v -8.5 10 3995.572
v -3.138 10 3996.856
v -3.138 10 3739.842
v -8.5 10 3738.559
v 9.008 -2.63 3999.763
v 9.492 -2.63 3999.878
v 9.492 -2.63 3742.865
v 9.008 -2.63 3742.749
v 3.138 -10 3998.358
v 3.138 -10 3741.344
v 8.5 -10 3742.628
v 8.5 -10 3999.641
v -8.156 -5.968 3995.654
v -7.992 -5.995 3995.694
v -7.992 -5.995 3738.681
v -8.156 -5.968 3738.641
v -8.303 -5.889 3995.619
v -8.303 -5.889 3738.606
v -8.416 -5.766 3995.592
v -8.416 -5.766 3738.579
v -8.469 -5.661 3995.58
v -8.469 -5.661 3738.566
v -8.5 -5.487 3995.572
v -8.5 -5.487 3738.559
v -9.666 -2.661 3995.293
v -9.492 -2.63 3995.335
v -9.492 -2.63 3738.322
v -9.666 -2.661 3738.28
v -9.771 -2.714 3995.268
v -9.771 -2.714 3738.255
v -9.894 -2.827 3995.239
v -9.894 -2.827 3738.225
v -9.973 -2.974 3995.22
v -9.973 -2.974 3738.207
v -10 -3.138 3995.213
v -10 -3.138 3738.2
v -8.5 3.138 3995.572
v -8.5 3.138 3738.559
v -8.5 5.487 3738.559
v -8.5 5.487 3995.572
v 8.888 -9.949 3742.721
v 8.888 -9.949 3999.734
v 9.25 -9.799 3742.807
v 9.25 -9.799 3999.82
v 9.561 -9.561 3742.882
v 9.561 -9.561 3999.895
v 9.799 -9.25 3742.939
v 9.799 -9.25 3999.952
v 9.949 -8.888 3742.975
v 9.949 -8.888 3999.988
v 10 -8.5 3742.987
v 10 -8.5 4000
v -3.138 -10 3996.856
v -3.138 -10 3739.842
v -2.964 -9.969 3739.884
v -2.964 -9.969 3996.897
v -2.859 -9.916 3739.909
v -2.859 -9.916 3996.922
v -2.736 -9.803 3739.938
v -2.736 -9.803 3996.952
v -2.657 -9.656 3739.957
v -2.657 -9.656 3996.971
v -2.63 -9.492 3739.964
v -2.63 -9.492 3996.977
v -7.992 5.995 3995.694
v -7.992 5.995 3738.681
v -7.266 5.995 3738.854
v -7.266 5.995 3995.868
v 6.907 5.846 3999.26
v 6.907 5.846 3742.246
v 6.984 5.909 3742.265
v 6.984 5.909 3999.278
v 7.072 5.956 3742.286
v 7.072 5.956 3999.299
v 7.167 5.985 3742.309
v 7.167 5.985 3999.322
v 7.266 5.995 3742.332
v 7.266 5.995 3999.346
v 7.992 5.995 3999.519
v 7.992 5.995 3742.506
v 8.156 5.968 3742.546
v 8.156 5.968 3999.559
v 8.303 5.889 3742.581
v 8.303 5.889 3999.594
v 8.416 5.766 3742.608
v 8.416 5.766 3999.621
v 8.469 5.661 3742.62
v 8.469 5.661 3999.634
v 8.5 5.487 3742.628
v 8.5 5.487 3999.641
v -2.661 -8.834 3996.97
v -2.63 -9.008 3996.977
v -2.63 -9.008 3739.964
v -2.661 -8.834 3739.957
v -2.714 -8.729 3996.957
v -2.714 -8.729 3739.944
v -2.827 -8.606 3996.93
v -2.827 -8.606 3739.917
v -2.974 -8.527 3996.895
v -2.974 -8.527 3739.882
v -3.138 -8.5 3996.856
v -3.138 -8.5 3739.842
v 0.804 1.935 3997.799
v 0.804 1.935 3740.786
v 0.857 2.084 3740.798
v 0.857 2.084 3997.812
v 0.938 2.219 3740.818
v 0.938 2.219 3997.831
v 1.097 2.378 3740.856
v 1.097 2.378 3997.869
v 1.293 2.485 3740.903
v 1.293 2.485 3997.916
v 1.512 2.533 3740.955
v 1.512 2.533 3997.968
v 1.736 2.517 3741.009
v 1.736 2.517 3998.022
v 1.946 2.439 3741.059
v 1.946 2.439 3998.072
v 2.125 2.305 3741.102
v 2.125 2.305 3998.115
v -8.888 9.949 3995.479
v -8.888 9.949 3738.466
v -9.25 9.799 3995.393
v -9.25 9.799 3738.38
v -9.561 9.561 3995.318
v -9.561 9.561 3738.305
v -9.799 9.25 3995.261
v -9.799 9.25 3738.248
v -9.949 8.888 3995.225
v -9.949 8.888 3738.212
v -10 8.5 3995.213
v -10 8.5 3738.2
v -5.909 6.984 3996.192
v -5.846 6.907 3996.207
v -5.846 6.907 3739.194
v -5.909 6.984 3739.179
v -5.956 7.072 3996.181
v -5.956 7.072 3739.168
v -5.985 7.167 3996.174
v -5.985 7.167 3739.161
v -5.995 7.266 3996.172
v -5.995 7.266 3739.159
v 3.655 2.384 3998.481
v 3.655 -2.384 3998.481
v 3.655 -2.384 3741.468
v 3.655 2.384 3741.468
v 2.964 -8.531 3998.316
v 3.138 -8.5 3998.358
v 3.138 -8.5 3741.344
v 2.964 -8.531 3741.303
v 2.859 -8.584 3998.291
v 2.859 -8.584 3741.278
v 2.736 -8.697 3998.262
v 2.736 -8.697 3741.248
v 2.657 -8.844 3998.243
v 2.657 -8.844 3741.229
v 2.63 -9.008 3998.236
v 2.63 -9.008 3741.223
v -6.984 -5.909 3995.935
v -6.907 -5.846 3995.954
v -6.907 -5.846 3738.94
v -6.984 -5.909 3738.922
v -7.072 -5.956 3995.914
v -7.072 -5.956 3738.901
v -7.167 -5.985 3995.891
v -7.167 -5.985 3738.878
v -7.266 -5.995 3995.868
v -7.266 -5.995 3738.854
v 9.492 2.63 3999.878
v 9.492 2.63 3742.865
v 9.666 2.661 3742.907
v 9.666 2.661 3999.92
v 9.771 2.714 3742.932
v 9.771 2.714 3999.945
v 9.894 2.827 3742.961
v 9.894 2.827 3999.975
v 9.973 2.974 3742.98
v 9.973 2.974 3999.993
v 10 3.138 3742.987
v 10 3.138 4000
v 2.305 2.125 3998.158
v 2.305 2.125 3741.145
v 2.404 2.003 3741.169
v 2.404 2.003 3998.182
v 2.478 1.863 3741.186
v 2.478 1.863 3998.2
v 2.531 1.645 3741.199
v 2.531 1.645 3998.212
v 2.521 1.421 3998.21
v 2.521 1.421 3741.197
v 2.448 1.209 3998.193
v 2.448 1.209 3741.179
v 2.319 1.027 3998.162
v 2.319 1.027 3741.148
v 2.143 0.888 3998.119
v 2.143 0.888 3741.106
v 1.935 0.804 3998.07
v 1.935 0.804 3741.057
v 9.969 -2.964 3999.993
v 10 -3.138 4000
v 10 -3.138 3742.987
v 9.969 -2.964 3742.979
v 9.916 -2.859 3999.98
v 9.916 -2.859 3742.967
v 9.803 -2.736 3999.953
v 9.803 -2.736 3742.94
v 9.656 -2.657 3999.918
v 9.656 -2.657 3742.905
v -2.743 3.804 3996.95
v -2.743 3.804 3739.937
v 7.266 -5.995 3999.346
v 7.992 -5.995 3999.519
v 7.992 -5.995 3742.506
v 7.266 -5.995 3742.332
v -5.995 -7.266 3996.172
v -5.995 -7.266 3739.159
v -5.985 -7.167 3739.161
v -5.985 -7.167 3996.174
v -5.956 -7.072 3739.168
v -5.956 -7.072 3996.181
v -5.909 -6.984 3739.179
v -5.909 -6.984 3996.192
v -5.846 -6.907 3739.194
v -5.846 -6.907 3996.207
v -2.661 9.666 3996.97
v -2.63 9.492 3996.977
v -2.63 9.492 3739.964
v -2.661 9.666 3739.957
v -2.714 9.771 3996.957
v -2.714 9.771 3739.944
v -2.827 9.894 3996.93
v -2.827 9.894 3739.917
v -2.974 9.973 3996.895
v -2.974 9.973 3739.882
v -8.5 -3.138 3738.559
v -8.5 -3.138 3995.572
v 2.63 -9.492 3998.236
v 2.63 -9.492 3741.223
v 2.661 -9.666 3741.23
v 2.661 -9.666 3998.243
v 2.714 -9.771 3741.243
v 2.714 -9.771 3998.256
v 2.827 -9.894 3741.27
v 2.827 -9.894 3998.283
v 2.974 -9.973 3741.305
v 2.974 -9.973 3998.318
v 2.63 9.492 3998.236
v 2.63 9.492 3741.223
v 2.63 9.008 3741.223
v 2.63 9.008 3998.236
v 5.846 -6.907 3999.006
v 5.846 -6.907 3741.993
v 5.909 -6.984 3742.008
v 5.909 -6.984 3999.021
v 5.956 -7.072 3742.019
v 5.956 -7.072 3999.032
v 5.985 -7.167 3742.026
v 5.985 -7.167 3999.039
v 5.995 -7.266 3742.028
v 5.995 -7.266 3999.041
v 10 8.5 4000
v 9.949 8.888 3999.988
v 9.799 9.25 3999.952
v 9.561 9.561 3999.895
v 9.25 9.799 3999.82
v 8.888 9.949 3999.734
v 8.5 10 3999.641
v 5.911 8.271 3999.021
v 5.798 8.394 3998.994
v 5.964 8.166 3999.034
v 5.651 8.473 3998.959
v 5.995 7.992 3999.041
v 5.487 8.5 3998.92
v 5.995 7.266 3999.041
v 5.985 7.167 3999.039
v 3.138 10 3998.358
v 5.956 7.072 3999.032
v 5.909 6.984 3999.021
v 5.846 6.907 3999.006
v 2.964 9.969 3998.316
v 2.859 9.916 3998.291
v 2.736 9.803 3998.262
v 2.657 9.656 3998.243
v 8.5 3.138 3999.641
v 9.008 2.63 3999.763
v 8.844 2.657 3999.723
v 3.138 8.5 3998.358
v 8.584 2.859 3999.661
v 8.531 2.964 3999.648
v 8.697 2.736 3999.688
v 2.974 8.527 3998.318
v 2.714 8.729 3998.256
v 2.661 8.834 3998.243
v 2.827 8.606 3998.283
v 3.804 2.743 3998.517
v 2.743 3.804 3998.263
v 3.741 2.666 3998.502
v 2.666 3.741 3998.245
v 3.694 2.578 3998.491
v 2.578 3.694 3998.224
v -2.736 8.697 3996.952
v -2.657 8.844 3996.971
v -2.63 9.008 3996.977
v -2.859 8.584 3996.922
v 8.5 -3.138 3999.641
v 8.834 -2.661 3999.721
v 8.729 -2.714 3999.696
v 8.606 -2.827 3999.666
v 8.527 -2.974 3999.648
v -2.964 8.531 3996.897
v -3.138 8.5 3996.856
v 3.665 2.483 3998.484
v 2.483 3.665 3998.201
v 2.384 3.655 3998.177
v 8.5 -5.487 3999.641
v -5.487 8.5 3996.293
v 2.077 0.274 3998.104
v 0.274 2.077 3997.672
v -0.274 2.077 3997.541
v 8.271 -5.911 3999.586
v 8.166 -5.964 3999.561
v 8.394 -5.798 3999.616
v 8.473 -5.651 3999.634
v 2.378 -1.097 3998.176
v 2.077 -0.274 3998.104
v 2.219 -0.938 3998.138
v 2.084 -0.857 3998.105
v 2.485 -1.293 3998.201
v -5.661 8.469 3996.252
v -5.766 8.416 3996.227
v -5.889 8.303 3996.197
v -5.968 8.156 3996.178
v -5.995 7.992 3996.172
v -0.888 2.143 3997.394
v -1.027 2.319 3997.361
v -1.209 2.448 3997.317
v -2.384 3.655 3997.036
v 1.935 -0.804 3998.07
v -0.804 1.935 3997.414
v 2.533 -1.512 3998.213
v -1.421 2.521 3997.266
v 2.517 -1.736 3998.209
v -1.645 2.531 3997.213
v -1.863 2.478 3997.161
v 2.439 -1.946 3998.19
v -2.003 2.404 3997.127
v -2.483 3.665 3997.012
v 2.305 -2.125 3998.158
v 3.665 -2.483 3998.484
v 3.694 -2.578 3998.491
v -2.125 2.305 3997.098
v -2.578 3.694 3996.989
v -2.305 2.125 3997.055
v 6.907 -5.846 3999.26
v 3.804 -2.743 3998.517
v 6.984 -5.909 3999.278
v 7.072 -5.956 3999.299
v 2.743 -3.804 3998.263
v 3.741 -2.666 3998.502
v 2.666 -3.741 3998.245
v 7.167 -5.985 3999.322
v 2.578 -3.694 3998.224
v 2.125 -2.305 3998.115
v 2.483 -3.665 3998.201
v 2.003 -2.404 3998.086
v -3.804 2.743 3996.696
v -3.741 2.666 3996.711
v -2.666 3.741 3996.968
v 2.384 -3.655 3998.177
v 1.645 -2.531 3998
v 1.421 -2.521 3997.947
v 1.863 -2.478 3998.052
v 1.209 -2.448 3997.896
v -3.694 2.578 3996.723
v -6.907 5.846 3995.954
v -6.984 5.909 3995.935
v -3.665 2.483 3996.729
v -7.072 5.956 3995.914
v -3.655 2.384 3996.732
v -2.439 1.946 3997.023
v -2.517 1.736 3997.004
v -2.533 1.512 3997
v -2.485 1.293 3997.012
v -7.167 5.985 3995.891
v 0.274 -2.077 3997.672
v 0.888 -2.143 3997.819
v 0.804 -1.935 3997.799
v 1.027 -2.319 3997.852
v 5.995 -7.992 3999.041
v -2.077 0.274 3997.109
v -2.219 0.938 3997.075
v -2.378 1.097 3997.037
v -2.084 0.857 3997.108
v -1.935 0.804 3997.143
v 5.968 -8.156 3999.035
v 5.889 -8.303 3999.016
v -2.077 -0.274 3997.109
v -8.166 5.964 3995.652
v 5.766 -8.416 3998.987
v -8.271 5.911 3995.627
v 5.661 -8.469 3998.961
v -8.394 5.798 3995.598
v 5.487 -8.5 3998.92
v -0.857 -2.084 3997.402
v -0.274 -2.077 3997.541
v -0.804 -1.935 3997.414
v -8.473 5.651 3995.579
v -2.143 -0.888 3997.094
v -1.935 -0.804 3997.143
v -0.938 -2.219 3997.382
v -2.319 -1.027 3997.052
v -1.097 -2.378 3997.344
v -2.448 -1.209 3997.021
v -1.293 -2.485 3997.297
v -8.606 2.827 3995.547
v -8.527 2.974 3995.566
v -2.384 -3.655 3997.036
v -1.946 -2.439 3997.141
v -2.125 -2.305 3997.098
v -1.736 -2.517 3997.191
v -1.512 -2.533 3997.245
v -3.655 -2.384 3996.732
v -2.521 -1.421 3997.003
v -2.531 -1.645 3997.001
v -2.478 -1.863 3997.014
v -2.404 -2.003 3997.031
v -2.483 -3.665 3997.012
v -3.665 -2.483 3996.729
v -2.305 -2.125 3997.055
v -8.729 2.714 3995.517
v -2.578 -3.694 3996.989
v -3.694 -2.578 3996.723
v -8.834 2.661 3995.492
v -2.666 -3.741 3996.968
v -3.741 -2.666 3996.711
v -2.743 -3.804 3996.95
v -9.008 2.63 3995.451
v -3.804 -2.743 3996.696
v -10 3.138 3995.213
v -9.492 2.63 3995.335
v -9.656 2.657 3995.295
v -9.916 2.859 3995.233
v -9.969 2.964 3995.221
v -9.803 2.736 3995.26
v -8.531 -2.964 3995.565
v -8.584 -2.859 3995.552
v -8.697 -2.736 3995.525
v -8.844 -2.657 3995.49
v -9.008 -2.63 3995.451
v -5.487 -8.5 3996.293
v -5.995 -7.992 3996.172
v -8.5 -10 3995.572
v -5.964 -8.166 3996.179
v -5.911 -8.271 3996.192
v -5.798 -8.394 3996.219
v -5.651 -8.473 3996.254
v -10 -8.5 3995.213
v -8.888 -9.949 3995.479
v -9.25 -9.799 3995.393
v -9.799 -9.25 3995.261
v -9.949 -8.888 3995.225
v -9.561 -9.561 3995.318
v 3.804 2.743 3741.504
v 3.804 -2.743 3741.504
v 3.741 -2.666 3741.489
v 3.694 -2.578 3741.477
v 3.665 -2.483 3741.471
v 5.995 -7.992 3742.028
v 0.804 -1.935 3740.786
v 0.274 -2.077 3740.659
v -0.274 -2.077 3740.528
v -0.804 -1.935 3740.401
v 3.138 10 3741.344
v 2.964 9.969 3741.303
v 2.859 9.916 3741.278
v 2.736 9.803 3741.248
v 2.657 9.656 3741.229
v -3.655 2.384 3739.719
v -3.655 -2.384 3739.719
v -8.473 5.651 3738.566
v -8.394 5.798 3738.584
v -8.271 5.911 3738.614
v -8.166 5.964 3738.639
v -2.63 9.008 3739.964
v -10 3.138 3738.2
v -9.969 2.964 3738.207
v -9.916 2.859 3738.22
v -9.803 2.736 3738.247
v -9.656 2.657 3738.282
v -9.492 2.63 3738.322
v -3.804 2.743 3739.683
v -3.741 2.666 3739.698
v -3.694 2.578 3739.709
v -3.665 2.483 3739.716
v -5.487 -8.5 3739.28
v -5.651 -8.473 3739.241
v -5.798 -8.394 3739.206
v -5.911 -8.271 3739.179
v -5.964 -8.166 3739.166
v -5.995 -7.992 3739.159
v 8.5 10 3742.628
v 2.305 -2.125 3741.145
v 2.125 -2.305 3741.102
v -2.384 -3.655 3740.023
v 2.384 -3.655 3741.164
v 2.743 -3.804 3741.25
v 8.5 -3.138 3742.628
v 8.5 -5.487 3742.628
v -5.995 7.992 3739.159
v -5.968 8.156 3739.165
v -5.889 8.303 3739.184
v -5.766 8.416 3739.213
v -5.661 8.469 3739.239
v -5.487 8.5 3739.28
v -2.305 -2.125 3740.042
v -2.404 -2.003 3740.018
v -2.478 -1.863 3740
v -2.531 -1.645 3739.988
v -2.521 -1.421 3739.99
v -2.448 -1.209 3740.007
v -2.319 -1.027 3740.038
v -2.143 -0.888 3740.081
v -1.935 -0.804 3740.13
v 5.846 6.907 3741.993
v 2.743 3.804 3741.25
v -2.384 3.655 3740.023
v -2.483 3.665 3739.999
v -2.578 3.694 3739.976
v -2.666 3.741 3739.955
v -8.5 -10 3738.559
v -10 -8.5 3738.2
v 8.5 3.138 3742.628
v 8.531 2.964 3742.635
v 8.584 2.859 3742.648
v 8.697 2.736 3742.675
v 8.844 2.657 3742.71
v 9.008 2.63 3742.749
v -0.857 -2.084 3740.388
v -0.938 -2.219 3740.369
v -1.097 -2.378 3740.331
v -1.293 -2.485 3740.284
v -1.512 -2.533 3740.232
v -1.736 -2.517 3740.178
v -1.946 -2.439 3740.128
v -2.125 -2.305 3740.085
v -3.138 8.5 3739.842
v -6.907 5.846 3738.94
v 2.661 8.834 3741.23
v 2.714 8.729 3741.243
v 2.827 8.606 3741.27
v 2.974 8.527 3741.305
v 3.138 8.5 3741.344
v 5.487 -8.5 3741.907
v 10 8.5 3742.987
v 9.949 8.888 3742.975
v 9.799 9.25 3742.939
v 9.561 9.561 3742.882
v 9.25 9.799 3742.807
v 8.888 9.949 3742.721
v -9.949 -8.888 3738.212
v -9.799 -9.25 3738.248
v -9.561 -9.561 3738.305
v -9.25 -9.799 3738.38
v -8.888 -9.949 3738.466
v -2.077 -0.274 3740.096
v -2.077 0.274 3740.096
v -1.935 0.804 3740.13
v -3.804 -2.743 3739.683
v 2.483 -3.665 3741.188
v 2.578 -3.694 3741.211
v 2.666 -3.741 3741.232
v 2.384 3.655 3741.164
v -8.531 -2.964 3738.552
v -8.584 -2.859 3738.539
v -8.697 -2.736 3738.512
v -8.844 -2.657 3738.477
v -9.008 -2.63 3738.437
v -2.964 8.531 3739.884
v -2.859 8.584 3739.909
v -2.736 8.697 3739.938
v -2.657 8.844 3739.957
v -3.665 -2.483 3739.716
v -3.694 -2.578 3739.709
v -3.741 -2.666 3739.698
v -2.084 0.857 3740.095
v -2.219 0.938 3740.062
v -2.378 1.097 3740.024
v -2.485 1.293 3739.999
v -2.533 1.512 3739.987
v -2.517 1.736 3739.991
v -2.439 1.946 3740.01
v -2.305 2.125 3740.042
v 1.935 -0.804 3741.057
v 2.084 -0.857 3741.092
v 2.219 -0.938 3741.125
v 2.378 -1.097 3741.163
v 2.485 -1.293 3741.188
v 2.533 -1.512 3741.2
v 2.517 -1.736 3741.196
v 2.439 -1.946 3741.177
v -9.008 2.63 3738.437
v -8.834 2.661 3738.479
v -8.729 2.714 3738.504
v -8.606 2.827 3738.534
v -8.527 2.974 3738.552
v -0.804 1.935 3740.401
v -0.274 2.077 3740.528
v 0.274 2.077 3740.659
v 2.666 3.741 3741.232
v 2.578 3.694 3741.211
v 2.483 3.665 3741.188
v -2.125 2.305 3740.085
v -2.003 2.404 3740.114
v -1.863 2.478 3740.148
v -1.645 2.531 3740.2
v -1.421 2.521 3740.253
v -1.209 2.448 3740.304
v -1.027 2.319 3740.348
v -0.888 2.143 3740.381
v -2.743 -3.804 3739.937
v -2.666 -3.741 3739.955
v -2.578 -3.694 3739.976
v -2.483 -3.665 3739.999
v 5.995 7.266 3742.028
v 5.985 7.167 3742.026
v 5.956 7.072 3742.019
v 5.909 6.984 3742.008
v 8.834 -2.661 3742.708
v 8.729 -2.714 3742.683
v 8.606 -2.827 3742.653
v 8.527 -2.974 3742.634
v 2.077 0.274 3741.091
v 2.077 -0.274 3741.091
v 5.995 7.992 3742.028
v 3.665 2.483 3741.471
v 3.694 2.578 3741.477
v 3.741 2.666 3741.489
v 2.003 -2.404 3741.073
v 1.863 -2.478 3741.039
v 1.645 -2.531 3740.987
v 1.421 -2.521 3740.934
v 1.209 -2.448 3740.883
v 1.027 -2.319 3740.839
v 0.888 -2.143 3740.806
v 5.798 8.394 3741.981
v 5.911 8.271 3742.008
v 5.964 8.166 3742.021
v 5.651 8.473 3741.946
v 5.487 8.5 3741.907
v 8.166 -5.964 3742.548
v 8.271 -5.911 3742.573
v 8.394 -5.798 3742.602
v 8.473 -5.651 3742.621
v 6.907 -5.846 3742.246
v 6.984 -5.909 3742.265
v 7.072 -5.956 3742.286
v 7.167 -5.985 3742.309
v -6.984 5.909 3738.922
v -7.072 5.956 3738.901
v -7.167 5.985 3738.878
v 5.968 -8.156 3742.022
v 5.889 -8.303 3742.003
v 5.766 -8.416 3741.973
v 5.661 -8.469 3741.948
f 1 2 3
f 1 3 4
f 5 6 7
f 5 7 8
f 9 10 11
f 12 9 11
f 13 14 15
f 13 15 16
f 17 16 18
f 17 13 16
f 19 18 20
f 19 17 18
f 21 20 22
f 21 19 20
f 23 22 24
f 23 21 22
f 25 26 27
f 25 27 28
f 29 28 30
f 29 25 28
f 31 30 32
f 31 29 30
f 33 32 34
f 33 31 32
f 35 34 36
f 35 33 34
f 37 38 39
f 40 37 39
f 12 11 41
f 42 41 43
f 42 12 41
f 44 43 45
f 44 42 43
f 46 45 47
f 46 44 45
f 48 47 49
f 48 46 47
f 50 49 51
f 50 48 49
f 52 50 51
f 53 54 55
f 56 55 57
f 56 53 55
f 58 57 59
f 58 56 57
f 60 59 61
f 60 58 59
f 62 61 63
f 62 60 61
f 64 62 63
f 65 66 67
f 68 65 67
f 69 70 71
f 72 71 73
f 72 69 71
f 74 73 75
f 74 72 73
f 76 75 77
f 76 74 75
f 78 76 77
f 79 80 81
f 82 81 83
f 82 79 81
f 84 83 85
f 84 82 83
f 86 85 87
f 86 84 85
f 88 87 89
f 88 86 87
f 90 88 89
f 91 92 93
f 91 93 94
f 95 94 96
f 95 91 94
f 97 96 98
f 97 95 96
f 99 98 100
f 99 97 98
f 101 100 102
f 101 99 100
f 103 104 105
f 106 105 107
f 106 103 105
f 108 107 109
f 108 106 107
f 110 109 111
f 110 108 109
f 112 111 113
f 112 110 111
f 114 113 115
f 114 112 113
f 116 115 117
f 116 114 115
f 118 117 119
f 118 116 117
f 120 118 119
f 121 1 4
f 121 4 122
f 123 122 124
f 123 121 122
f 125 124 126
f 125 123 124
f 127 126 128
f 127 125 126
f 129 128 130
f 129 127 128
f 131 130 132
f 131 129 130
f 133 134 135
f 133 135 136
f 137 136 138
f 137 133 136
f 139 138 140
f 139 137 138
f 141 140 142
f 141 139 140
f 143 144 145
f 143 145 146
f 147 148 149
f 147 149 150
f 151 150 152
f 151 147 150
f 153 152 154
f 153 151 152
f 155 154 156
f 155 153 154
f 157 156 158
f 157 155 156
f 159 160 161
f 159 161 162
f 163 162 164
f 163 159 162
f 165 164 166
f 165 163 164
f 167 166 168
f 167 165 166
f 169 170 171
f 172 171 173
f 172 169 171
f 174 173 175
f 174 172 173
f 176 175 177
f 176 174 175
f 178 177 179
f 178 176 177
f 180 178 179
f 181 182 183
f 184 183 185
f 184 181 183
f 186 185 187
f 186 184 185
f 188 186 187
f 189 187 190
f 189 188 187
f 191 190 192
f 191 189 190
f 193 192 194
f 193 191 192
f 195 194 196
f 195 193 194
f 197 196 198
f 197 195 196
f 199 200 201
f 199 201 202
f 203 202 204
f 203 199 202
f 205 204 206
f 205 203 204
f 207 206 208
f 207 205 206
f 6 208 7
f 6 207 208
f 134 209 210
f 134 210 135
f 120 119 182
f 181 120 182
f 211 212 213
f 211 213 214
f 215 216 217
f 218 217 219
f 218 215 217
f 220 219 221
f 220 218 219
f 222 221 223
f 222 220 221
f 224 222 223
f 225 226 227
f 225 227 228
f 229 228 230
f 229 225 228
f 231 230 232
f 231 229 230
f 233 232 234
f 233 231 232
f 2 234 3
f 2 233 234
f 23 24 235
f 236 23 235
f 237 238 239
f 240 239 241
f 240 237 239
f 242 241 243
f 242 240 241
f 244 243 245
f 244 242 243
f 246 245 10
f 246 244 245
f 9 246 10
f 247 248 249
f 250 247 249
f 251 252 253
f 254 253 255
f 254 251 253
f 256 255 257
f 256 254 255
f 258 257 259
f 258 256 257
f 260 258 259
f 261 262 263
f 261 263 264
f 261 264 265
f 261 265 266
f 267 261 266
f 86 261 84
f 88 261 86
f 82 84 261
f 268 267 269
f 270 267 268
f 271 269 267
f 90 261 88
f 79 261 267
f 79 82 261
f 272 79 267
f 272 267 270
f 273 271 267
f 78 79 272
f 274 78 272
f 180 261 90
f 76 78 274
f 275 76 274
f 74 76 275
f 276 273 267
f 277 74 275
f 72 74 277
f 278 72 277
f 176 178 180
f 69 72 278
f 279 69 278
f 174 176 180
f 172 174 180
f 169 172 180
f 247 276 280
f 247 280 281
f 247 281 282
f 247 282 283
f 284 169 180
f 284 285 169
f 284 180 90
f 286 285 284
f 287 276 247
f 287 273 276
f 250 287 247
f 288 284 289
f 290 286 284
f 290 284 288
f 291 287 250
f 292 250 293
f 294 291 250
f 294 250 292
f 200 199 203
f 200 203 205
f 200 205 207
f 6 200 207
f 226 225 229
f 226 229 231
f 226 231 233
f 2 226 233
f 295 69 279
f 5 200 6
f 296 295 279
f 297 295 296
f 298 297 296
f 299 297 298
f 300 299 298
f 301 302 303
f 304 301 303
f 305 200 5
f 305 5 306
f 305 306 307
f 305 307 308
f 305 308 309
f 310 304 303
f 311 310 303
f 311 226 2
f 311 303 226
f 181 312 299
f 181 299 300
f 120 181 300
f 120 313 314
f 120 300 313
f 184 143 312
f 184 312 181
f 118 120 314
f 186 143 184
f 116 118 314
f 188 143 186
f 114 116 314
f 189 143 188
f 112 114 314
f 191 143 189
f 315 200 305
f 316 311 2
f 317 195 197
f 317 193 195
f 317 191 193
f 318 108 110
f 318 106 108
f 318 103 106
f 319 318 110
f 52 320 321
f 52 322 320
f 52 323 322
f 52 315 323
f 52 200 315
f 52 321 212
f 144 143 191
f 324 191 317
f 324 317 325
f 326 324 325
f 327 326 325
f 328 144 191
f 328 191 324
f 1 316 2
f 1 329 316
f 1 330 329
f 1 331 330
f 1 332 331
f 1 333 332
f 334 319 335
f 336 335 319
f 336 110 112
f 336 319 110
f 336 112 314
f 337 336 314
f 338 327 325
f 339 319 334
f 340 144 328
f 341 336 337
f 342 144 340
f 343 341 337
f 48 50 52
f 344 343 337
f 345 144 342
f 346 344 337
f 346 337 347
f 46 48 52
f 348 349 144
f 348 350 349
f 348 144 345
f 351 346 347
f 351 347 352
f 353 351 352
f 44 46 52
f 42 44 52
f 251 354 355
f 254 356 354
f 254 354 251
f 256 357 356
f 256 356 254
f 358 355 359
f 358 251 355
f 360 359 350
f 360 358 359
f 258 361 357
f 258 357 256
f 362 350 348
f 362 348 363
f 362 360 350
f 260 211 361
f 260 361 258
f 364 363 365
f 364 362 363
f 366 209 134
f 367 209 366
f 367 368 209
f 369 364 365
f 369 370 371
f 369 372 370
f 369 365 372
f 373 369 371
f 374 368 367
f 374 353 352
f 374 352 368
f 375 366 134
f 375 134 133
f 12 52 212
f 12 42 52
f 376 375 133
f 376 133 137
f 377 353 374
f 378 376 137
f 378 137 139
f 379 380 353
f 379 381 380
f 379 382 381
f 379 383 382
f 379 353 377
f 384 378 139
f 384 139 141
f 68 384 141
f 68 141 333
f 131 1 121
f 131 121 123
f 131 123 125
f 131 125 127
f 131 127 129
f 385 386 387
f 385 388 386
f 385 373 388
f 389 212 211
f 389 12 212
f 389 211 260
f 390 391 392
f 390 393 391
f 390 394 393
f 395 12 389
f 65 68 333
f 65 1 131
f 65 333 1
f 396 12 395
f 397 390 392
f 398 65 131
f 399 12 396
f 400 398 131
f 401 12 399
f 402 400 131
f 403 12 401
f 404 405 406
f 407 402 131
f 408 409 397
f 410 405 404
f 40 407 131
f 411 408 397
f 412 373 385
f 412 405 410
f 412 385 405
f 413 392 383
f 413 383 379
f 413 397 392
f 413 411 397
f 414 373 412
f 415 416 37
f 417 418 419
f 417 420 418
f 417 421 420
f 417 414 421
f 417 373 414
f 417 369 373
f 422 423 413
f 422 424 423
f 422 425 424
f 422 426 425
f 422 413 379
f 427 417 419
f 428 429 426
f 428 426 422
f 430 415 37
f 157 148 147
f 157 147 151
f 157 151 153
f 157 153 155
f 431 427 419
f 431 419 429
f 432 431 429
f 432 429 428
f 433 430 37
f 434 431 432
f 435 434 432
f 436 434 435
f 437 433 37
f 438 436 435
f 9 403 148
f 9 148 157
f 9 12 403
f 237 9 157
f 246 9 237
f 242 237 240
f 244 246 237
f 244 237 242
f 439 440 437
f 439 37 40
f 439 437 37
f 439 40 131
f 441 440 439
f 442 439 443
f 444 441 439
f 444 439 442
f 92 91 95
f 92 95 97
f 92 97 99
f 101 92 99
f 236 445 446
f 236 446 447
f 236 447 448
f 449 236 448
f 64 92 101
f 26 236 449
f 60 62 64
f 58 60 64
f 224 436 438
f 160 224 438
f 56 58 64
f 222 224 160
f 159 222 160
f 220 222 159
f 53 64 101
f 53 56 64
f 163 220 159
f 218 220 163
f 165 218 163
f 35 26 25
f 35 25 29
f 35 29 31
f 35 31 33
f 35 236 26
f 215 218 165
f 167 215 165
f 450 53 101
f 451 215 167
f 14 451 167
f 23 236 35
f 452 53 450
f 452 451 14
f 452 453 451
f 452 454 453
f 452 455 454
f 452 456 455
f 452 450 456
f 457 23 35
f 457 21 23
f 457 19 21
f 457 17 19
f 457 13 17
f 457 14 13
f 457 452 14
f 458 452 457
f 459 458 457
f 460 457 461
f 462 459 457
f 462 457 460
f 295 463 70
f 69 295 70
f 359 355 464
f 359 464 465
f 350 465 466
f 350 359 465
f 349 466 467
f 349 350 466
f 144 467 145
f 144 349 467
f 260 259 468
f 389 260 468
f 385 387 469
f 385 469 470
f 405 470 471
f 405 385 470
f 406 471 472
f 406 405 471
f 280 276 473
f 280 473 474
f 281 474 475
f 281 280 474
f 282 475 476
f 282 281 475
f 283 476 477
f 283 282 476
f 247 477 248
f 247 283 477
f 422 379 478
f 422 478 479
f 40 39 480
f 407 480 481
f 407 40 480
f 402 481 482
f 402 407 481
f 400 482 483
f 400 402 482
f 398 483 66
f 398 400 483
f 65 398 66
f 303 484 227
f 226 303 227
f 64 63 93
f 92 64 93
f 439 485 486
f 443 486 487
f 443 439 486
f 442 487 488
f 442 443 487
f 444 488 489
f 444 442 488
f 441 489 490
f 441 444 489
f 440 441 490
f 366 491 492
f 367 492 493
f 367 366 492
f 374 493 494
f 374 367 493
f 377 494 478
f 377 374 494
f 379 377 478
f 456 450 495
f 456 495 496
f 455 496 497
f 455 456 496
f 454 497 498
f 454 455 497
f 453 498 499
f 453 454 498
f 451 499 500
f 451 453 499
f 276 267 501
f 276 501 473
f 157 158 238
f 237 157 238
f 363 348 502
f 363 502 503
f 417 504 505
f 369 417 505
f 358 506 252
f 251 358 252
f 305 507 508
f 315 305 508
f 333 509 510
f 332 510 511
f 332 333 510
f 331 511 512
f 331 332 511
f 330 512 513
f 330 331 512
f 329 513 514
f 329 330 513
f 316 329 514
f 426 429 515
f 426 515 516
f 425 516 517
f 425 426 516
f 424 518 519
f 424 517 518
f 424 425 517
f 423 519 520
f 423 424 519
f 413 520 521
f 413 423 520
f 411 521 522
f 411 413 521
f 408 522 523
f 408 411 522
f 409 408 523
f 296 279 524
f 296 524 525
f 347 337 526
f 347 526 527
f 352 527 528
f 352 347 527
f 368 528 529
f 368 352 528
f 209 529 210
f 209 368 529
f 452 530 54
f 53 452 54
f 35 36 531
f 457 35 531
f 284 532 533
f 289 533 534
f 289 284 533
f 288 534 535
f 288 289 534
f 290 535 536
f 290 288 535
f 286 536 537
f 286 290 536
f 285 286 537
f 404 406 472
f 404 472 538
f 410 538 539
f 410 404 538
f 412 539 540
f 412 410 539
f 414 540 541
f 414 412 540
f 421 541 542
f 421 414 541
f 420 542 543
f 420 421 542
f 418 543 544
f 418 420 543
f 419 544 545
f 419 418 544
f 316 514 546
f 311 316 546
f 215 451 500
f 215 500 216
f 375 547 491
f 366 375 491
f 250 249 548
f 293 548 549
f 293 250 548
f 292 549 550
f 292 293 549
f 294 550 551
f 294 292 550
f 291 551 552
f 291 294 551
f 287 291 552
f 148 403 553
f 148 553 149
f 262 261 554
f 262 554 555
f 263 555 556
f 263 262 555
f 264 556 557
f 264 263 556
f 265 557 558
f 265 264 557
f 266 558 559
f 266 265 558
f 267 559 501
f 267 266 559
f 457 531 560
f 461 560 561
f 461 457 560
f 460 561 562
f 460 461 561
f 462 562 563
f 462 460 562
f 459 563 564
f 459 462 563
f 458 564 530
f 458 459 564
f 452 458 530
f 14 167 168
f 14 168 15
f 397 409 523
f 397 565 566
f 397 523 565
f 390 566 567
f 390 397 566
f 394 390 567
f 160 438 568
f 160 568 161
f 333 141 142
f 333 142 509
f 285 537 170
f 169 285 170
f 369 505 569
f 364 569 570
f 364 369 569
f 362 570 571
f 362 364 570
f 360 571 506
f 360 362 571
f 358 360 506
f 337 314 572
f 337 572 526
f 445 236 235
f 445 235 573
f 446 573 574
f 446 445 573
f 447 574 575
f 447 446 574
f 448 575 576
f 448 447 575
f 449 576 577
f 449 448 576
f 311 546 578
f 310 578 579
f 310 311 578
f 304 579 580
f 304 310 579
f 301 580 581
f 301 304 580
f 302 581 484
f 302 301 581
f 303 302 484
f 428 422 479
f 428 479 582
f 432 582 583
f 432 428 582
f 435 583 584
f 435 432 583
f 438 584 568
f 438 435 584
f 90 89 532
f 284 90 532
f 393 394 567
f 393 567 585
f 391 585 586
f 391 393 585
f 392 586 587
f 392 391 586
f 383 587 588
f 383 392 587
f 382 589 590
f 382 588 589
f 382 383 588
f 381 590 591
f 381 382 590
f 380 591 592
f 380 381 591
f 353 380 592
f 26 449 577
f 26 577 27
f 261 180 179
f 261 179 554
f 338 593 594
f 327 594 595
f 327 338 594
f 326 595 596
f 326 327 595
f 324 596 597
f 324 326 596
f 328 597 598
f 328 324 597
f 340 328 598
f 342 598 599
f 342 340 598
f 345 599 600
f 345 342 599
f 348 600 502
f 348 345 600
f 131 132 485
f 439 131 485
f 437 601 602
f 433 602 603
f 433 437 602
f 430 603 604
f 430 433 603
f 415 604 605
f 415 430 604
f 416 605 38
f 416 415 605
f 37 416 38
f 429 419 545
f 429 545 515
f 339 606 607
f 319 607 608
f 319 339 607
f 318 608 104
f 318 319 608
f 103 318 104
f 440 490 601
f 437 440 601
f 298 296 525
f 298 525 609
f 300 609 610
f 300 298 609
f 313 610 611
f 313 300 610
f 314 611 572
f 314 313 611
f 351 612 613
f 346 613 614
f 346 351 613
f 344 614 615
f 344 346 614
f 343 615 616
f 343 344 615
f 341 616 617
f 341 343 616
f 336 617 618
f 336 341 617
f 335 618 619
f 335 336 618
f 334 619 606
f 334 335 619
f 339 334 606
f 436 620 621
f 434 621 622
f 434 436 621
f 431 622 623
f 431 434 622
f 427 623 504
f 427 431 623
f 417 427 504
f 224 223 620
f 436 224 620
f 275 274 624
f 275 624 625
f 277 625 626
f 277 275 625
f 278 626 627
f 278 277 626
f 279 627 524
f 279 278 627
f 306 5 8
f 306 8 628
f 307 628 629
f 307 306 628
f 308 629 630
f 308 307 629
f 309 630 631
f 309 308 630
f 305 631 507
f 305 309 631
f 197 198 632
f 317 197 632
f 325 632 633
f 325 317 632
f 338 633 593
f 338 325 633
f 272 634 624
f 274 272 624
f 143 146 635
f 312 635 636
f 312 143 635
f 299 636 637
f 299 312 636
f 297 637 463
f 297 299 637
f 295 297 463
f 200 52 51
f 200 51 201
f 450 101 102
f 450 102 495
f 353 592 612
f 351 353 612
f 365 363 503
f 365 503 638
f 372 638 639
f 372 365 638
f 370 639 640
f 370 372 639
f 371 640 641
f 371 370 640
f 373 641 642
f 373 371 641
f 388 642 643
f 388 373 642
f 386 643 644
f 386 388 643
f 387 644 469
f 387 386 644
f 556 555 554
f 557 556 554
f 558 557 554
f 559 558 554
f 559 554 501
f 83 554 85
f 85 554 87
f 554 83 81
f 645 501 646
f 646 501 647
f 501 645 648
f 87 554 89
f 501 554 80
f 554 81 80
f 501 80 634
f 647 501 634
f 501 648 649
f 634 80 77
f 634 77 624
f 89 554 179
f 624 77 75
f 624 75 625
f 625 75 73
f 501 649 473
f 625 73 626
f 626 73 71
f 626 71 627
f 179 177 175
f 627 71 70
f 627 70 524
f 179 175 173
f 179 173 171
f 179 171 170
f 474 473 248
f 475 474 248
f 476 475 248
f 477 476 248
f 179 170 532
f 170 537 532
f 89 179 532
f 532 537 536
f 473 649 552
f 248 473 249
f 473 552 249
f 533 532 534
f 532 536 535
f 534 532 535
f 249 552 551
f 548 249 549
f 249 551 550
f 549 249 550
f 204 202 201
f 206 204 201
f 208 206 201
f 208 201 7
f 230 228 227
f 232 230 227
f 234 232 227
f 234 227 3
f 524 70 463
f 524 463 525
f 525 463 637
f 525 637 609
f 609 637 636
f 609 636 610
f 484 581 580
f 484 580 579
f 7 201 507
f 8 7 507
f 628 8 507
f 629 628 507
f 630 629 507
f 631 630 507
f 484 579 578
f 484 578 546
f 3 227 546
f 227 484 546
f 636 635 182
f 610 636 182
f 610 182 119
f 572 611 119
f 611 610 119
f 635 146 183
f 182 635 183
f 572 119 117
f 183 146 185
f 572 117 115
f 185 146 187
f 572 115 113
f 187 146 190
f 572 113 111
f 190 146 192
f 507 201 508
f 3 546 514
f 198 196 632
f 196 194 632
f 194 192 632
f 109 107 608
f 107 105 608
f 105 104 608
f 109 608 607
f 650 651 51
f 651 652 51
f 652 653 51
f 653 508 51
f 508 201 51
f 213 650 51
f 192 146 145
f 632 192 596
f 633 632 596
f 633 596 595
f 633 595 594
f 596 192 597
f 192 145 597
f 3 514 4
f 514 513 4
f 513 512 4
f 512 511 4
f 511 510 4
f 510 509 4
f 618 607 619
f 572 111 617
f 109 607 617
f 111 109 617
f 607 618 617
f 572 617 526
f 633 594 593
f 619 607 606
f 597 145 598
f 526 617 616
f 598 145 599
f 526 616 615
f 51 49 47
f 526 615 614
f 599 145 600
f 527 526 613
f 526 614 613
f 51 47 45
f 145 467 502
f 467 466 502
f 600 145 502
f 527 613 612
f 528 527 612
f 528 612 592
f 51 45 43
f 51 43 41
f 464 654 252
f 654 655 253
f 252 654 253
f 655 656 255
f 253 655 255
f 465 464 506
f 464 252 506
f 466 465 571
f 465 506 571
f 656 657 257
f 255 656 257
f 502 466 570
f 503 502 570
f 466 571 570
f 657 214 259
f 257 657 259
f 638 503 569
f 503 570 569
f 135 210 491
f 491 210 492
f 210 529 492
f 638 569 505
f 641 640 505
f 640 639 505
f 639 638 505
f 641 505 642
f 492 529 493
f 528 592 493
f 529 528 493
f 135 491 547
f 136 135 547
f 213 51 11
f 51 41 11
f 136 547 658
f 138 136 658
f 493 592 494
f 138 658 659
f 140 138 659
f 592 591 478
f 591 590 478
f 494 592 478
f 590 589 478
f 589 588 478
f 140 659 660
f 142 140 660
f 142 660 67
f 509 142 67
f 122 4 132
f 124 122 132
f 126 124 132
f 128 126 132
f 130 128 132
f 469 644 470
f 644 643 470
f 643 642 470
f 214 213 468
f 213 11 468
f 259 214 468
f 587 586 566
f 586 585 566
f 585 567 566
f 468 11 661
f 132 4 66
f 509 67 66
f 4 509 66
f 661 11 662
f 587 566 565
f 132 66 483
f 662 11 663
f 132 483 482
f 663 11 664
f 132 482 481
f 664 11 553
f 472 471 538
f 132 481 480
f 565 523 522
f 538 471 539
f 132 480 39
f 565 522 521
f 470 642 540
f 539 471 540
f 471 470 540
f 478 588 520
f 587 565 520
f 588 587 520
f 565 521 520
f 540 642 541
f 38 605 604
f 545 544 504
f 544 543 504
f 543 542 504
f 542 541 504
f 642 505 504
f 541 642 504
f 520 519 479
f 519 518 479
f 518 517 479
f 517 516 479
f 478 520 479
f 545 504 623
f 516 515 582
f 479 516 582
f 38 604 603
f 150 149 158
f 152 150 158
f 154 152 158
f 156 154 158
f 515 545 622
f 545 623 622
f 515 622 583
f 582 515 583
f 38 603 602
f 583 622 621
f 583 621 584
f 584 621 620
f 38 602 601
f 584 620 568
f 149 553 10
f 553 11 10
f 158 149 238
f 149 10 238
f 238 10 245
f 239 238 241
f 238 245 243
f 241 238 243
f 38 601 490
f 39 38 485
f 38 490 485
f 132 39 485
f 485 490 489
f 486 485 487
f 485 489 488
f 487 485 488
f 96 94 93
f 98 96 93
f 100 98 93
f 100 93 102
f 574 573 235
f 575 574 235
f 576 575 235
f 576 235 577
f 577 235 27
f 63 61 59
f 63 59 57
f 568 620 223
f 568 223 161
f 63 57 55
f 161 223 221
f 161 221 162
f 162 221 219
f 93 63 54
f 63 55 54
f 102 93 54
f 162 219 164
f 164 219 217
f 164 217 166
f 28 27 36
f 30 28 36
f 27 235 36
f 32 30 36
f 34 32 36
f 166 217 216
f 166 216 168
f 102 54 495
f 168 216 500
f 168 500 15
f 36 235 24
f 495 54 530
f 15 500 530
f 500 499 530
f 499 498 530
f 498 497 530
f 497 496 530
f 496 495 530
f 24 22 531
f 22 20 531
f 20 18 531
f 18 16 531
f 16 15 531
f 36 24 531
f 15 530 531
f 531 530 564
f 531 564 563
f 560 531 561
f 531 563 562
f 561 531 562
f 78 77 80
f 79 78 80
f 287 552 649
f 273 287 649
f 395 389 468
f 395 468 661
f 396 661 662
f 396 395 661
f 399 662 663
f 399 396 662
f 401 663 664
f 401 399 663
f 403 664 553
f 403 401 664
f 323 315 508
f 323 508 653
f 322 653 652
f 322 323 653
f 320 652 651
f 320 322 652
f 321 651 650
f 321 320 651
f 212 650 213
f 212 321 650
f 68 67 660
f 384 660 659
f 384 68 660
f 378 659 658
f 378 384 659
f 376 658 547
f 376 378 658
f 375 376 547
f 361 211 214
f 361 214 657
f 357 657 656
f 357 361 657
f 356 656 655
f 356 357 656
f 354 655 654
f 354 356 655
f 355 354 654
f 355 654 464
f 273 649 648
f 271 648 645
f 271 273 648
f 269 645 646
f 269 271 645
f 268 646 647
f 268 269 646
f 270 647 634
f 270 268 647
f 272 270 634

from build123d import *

# Parameters (mm, degrees)
BOSS_EXTRUDE1_DEPTH = 261.8
CUT_EXTRUDE1_DEPTH  = 4001.062499512


with BuildPart() as part:
    # Sketch1 → Boss-Extrude1 (new body)
    with BuildSketch(Plane.XY.offset(4000)):
        with BuildLine():
            Line((10, 3.138), (10, 8.5))
            ThreePointArc((10, 8.5), (9.560660172, 9.560660172), (8.5, 10))
            Line((8.5, 10), (3.138, 10))
            ThreePointArc((3.138, 10), (2.778789755, 9.851210245), (2.63, 9.492))
            Line((2.63, 9.492), (2.63, 9.008))
            ThreePointArc((2.63, 9.008), (2.778789755, 8.648789755), (3.138, 8.5))
            Line((3.138, 8.5), (5.487, 8.5))
            ThreePointArc((5.487, 8.5), (5.846210245, 8.351210245), (5.995, 7.992))
            Line((5.995, 7.992), (5.995, 7.266080661))
            ThreePointArc((5.995, 7.266080661), (5.956330803, 7.071677478), (5.846210245, 6.906870417))
            Line((5.846210245, 6.906870417), (2.743129583, 3.803789755))
            ThreePointArc((2.743129583, 3.803789755), (2.578322522, 3.693669197), (2.383919339, 3.655))
            Line((2.383919339, 3.655), (-2.383919339, 3.655))
            ThreePointArc((-2.383919339, 3.655), (-2.578322522, 3.693669197), (-2.743129583, 3.803789755))
            Line((-2.743129583, 3.803789755), (-5.846210245, 6.906870417))
            ThreePointArc((-5.846210245, 6.906870417), (-5.956330803, 7.071677478), (-5.995, 7.266080661))
            Line((-5.995, 7.266080661), (-5.995, 7.992))
            ThreePointArc((-5.995, 7.992), (-5.846210245, 8.351210245), (-5.487, 8.5))
            Line((-5.487, 8.5), (-3.138, 8.5))
            ThreePointArc((-3.138, 8.5), (-2.778789755, 8.648789755), (-2.63, 9.008))
            Line((-2.63, 9.008), (-2.63, 9.492))
            ThreePointArc((-2.63, 9.492), (-2.778789755, 9.851210245), (-3.138, 10))
            Line((-3.138, 10), (-8.5, 10))
            ThreePointArc((-8.5, 10), (-9.560660172, 9.560660172), (-10, 8.5))
            Line((-10, 8.5), (-10, 3.138))
            ThreePointArc((-10, 3.138), (-9.851210245, 2.778789755), (-9.492, 2.63))
            Line((-9.492, 2.63), (-9.008, 2.63))
            ThreePointArc((-9.008, 2.63), (-8.648789755, 2.778789755), (-8.5, 3.138))
            Line((-8.5, 3.138), (-8.5, 5.487))
            ThreePointArc((-8.5, 5.487), (-8.351210245, 5.846210245), (-7.992, 5.995))
            Line((-7.992, 5.995), (-7.266080661, 5.995))
            ThreePointArc((-7.266080661, 5.995), (-7.071677478, 5.956330803), (-6.906870417, 5.846210245))
            Line((-6.906870417, 5.846210245), (-3.803789755, 2.743129583))
            ThreePointArc((-3.803789755, 2.743129583), (-3.693669197, 2.578322522), (-3.655, 2.383919339))
            Line((-3.655, 2.383919339), (-3.655, -2.383919339))
            ThreePointArc((-3.655, -2.383919339), (-3.693669197, -2.578322522), (-3.803789755, -2.743129583))
            Line((-3.803789755, -2.743129583), (-6.906870417, -5.846210245))
            ThreePointArc((-6.906870417, -5.846210245), (-7.071677478, -5.956330803), (-7.266080661, -5.995))
            Line((-7.266080661, -5.995), (-7.992, -5.995))
            ThreePointArc((-7.992, -5.995), (-8.351210245, -5.846210245), (-8.5, -5.487))
            Line((-8.5, -5.487), (-8.5, -3.138))
            ThreePointArc((-8.5, -3.138), (-8.648789755, -2.778789755), (-9.008, -2.63))
            Line((-9.008, -2.63), (-9.492, -2.63))
            ThreePointArc((-9.492, -2.63), (-9.851210245, -2.778789755), (-10, -3.138))
            Line((-10, -3.138), (-10, -8.5))
            ThreePointArc((-10, -8.5), (-9.560660172, -9.560660172), (-8.5, -10))
            Line((-8.5, -10), (-3.138, -10))
            ThreePointArc((-3.138, -10), (-2.778789755, -9.851210245), (-2.63, -9.492))
            Line((-2.63, -9.492), (-2.63, -9.008))
            ThreePointArc((-2.63, -9.008), (-2.778789755, -8.648789755), (-3.138, -8.5))
            Line((-3.138, -8.5), (-5.487, -8.5))
            ThreePointArc((-5.487, -8.5), (-5.846210245, -8.351210245), (-5.995, -7.992))
            Line((-5.995, -7.992), (-5.995, -7.266080661))
            ThreePointArc((-5.995, -7.266080661), (-5.956330803, -7.071677478), (-5.846210245, -6.906870417))
            Line((-5.846210245, -6.906870417), (-2.743129583, -3.803789755))
            ThreePointArc((-2.743129583, -3.803789755), (-2.578322522, -3.693669197), (-2.383919339, -3.655))
            Line((-2.383919339, -3.655), (2.383919339, -3.655))
            ThreePointArc((2.383919339, -3.655), (2.578322522, -3.693669197), (2.743129583, -3.803789755))
            Line((2.743129583, -3.803789755), (5.846210245, -6.906870417))
            ThreePointArc((5.846210245, -6.906870417), (5.956330803, -7.071677478), (5.995, -7.266080661))
            Line((5.995, -7.266080661), (5.995, -7.992))
            ThreePointArc((5.995, -7.992), (5.846210245, -8.351210245), (5.487, -8.5))
            Line((5.487, -8.5), (3.138, -8.5))
            ThreePointArc((3.138, -8.5), (2.778789755, -8.648789755), (2.63, -9.008))
            Line((2.63, -9.008), (2.63, -9.492))
            ThreePointArc((2.63, -9.492), (2.778789755, -9.851210245), (3.138, -10))
            Line((3.138, -10), (8.5, -10))
            ThreePointArc((8.5, -10), (9.560660172, -9.560660172), (10, -8.5))
            Line((10, -8.5), (10, -3.138))
            ThreePointArc((10, -3.138), (9.851210245, -2.778789755), (9.492, -2.63))
            Line((9.492, -2.63), (9.008, -2.63))
            ThreePointArc((9.008, -2.63), (8.648789755, -2.778789755), (8.5, -3.138))
            Line((8.5, -3.138), (8.5, -5.487))
            ThreePointArc((8.5, -5.487), (8.351210245, -5.846210245), (7.992, -5.995))
            Line((7.992, -5.995), (7.266080661, -5.995))
            ThreePointArc((7.266080661, -5.995), (7.071677478, -5.956330803), (6.906870417, -5.846210245))
            Line((6.906870417, -5.846210245), (3.803789755, -2.743129583))
            ThreePointArc((3.803789755, -2.743129583), (3.693669197, -2.578322522), (3.655, -2.383919339))
            Line((3.655, -2.383919339), (3.655, 2.383919339))
            ThreePointArc((3.655, 2.383919339), (3.693669197, 2.578322522), (3.803789755, 2.743129583))
            Line((3.803789755, 2.743129583), (6.906870417, 5.846210245))
            ThreePointArc((6.906870417, 5.846210245), (7.071677478, 5.956330803), (7.266080661, 5.995))
            Line((7.266080661, 5.995), (7.992, 5.995))
            ThreePointArc((7.992, 5.995), (8.351210245, 5.846210245), (8.5, 5.487))
            Line((8.5, 5.487), (8.5, 3.138))
            ThreePointArc((8.5, 3.138), (8.648789755, 2.778789755), (9.008, 2.63))
            Line((9.008, 2.63), (9.492, 2.63))
            ThreePointArc((9.492, 2.63), (9.851210245, 2.778789755), (10, 3.138))
        make_face()
        with BuildLine():
            Line((-2.124900844, -2.304505966), (-2.304505966, -2.124900844))
            ThreePointArc((-2.304505966, -2.124900844), (-2.505938017, -1.356467811), (-1.935133506, -0.803976718))
            ThreePointArc((-1.935133506, -0.803976718), (-2.0955, 0), (-1.935133506, 0.803976718))
            ThreePointArc((-1.935133506, 0.803976718), (-2.505938017, 1.356467811), (-2.304505966, 2.124900844))
            Line((-2.304505966, 2.124900844), (-2.124900844, 2.304505966))
            ThreePointArc((-2.124900844, 2.304505966), (-1.356467811, 2.505938017), (-0.803976718, 1.935133506))
            ThreePointArc((-0.803976718, 1.935133506), (0, 2.0955), (0.803976718, 1.935133506))
            ThreePointArc((0.803976718, 1.935133506), (1.356467811, 2.505938017), (2.124900844, 2.304505966))
            Line((2.124900844, 2.304505966), (2.304505966, 2.124900844))
            ThreePointArc((2.304505966, 2.124900844), (2.505938017, 1.356467811), (1.935133506, 0.803976718))
            ThreePointArc((1.935133506, 0.803976718), (2.0955, 0), (1.935133506, -0.803976718))
            ThreePointArc((1.935133506, -0.803976718), (2.505938017, -1.356467811), (2.304505966, -2.124900844))
            Line((2.304505966, -2.124900844), (2.124900844, -2.304505966))
            ThreePointArc((2.124900844, -2.304505966), (1.356467811, -2.505938017), (0.803976718, -1.935133506))
            ThreePointArc((0.803976718, -1.935133506), (0, -2.0955), (-0.803976718, -1.935133506))
            ThreePointArc((-0.803976718, -1.935133506), (-1.356467811, -2.505938017), (-2.124900844, -2.304505966))
        make_face(mode=Mode.SUBTRACT)
    extrude(amount=-BOSS_EXTRUDE1_DEPTH)

    # Sketch2 → Cut-Extrude1 (cut, through all)
    with BuildSketch(Plane.XZ.offset(10)):
        Polygon((10, 4000), (-10, 3995.213189756), (-10, 4000), align=None)
        Polygon((10, 3738.2), (10, 3742.986810244), (-10, 3738.2), align=None)
    extrude(amount=-CUT_EXTRUDE1_DEPTH, mode=Mode.SUBTRACT)


solid = part.part
